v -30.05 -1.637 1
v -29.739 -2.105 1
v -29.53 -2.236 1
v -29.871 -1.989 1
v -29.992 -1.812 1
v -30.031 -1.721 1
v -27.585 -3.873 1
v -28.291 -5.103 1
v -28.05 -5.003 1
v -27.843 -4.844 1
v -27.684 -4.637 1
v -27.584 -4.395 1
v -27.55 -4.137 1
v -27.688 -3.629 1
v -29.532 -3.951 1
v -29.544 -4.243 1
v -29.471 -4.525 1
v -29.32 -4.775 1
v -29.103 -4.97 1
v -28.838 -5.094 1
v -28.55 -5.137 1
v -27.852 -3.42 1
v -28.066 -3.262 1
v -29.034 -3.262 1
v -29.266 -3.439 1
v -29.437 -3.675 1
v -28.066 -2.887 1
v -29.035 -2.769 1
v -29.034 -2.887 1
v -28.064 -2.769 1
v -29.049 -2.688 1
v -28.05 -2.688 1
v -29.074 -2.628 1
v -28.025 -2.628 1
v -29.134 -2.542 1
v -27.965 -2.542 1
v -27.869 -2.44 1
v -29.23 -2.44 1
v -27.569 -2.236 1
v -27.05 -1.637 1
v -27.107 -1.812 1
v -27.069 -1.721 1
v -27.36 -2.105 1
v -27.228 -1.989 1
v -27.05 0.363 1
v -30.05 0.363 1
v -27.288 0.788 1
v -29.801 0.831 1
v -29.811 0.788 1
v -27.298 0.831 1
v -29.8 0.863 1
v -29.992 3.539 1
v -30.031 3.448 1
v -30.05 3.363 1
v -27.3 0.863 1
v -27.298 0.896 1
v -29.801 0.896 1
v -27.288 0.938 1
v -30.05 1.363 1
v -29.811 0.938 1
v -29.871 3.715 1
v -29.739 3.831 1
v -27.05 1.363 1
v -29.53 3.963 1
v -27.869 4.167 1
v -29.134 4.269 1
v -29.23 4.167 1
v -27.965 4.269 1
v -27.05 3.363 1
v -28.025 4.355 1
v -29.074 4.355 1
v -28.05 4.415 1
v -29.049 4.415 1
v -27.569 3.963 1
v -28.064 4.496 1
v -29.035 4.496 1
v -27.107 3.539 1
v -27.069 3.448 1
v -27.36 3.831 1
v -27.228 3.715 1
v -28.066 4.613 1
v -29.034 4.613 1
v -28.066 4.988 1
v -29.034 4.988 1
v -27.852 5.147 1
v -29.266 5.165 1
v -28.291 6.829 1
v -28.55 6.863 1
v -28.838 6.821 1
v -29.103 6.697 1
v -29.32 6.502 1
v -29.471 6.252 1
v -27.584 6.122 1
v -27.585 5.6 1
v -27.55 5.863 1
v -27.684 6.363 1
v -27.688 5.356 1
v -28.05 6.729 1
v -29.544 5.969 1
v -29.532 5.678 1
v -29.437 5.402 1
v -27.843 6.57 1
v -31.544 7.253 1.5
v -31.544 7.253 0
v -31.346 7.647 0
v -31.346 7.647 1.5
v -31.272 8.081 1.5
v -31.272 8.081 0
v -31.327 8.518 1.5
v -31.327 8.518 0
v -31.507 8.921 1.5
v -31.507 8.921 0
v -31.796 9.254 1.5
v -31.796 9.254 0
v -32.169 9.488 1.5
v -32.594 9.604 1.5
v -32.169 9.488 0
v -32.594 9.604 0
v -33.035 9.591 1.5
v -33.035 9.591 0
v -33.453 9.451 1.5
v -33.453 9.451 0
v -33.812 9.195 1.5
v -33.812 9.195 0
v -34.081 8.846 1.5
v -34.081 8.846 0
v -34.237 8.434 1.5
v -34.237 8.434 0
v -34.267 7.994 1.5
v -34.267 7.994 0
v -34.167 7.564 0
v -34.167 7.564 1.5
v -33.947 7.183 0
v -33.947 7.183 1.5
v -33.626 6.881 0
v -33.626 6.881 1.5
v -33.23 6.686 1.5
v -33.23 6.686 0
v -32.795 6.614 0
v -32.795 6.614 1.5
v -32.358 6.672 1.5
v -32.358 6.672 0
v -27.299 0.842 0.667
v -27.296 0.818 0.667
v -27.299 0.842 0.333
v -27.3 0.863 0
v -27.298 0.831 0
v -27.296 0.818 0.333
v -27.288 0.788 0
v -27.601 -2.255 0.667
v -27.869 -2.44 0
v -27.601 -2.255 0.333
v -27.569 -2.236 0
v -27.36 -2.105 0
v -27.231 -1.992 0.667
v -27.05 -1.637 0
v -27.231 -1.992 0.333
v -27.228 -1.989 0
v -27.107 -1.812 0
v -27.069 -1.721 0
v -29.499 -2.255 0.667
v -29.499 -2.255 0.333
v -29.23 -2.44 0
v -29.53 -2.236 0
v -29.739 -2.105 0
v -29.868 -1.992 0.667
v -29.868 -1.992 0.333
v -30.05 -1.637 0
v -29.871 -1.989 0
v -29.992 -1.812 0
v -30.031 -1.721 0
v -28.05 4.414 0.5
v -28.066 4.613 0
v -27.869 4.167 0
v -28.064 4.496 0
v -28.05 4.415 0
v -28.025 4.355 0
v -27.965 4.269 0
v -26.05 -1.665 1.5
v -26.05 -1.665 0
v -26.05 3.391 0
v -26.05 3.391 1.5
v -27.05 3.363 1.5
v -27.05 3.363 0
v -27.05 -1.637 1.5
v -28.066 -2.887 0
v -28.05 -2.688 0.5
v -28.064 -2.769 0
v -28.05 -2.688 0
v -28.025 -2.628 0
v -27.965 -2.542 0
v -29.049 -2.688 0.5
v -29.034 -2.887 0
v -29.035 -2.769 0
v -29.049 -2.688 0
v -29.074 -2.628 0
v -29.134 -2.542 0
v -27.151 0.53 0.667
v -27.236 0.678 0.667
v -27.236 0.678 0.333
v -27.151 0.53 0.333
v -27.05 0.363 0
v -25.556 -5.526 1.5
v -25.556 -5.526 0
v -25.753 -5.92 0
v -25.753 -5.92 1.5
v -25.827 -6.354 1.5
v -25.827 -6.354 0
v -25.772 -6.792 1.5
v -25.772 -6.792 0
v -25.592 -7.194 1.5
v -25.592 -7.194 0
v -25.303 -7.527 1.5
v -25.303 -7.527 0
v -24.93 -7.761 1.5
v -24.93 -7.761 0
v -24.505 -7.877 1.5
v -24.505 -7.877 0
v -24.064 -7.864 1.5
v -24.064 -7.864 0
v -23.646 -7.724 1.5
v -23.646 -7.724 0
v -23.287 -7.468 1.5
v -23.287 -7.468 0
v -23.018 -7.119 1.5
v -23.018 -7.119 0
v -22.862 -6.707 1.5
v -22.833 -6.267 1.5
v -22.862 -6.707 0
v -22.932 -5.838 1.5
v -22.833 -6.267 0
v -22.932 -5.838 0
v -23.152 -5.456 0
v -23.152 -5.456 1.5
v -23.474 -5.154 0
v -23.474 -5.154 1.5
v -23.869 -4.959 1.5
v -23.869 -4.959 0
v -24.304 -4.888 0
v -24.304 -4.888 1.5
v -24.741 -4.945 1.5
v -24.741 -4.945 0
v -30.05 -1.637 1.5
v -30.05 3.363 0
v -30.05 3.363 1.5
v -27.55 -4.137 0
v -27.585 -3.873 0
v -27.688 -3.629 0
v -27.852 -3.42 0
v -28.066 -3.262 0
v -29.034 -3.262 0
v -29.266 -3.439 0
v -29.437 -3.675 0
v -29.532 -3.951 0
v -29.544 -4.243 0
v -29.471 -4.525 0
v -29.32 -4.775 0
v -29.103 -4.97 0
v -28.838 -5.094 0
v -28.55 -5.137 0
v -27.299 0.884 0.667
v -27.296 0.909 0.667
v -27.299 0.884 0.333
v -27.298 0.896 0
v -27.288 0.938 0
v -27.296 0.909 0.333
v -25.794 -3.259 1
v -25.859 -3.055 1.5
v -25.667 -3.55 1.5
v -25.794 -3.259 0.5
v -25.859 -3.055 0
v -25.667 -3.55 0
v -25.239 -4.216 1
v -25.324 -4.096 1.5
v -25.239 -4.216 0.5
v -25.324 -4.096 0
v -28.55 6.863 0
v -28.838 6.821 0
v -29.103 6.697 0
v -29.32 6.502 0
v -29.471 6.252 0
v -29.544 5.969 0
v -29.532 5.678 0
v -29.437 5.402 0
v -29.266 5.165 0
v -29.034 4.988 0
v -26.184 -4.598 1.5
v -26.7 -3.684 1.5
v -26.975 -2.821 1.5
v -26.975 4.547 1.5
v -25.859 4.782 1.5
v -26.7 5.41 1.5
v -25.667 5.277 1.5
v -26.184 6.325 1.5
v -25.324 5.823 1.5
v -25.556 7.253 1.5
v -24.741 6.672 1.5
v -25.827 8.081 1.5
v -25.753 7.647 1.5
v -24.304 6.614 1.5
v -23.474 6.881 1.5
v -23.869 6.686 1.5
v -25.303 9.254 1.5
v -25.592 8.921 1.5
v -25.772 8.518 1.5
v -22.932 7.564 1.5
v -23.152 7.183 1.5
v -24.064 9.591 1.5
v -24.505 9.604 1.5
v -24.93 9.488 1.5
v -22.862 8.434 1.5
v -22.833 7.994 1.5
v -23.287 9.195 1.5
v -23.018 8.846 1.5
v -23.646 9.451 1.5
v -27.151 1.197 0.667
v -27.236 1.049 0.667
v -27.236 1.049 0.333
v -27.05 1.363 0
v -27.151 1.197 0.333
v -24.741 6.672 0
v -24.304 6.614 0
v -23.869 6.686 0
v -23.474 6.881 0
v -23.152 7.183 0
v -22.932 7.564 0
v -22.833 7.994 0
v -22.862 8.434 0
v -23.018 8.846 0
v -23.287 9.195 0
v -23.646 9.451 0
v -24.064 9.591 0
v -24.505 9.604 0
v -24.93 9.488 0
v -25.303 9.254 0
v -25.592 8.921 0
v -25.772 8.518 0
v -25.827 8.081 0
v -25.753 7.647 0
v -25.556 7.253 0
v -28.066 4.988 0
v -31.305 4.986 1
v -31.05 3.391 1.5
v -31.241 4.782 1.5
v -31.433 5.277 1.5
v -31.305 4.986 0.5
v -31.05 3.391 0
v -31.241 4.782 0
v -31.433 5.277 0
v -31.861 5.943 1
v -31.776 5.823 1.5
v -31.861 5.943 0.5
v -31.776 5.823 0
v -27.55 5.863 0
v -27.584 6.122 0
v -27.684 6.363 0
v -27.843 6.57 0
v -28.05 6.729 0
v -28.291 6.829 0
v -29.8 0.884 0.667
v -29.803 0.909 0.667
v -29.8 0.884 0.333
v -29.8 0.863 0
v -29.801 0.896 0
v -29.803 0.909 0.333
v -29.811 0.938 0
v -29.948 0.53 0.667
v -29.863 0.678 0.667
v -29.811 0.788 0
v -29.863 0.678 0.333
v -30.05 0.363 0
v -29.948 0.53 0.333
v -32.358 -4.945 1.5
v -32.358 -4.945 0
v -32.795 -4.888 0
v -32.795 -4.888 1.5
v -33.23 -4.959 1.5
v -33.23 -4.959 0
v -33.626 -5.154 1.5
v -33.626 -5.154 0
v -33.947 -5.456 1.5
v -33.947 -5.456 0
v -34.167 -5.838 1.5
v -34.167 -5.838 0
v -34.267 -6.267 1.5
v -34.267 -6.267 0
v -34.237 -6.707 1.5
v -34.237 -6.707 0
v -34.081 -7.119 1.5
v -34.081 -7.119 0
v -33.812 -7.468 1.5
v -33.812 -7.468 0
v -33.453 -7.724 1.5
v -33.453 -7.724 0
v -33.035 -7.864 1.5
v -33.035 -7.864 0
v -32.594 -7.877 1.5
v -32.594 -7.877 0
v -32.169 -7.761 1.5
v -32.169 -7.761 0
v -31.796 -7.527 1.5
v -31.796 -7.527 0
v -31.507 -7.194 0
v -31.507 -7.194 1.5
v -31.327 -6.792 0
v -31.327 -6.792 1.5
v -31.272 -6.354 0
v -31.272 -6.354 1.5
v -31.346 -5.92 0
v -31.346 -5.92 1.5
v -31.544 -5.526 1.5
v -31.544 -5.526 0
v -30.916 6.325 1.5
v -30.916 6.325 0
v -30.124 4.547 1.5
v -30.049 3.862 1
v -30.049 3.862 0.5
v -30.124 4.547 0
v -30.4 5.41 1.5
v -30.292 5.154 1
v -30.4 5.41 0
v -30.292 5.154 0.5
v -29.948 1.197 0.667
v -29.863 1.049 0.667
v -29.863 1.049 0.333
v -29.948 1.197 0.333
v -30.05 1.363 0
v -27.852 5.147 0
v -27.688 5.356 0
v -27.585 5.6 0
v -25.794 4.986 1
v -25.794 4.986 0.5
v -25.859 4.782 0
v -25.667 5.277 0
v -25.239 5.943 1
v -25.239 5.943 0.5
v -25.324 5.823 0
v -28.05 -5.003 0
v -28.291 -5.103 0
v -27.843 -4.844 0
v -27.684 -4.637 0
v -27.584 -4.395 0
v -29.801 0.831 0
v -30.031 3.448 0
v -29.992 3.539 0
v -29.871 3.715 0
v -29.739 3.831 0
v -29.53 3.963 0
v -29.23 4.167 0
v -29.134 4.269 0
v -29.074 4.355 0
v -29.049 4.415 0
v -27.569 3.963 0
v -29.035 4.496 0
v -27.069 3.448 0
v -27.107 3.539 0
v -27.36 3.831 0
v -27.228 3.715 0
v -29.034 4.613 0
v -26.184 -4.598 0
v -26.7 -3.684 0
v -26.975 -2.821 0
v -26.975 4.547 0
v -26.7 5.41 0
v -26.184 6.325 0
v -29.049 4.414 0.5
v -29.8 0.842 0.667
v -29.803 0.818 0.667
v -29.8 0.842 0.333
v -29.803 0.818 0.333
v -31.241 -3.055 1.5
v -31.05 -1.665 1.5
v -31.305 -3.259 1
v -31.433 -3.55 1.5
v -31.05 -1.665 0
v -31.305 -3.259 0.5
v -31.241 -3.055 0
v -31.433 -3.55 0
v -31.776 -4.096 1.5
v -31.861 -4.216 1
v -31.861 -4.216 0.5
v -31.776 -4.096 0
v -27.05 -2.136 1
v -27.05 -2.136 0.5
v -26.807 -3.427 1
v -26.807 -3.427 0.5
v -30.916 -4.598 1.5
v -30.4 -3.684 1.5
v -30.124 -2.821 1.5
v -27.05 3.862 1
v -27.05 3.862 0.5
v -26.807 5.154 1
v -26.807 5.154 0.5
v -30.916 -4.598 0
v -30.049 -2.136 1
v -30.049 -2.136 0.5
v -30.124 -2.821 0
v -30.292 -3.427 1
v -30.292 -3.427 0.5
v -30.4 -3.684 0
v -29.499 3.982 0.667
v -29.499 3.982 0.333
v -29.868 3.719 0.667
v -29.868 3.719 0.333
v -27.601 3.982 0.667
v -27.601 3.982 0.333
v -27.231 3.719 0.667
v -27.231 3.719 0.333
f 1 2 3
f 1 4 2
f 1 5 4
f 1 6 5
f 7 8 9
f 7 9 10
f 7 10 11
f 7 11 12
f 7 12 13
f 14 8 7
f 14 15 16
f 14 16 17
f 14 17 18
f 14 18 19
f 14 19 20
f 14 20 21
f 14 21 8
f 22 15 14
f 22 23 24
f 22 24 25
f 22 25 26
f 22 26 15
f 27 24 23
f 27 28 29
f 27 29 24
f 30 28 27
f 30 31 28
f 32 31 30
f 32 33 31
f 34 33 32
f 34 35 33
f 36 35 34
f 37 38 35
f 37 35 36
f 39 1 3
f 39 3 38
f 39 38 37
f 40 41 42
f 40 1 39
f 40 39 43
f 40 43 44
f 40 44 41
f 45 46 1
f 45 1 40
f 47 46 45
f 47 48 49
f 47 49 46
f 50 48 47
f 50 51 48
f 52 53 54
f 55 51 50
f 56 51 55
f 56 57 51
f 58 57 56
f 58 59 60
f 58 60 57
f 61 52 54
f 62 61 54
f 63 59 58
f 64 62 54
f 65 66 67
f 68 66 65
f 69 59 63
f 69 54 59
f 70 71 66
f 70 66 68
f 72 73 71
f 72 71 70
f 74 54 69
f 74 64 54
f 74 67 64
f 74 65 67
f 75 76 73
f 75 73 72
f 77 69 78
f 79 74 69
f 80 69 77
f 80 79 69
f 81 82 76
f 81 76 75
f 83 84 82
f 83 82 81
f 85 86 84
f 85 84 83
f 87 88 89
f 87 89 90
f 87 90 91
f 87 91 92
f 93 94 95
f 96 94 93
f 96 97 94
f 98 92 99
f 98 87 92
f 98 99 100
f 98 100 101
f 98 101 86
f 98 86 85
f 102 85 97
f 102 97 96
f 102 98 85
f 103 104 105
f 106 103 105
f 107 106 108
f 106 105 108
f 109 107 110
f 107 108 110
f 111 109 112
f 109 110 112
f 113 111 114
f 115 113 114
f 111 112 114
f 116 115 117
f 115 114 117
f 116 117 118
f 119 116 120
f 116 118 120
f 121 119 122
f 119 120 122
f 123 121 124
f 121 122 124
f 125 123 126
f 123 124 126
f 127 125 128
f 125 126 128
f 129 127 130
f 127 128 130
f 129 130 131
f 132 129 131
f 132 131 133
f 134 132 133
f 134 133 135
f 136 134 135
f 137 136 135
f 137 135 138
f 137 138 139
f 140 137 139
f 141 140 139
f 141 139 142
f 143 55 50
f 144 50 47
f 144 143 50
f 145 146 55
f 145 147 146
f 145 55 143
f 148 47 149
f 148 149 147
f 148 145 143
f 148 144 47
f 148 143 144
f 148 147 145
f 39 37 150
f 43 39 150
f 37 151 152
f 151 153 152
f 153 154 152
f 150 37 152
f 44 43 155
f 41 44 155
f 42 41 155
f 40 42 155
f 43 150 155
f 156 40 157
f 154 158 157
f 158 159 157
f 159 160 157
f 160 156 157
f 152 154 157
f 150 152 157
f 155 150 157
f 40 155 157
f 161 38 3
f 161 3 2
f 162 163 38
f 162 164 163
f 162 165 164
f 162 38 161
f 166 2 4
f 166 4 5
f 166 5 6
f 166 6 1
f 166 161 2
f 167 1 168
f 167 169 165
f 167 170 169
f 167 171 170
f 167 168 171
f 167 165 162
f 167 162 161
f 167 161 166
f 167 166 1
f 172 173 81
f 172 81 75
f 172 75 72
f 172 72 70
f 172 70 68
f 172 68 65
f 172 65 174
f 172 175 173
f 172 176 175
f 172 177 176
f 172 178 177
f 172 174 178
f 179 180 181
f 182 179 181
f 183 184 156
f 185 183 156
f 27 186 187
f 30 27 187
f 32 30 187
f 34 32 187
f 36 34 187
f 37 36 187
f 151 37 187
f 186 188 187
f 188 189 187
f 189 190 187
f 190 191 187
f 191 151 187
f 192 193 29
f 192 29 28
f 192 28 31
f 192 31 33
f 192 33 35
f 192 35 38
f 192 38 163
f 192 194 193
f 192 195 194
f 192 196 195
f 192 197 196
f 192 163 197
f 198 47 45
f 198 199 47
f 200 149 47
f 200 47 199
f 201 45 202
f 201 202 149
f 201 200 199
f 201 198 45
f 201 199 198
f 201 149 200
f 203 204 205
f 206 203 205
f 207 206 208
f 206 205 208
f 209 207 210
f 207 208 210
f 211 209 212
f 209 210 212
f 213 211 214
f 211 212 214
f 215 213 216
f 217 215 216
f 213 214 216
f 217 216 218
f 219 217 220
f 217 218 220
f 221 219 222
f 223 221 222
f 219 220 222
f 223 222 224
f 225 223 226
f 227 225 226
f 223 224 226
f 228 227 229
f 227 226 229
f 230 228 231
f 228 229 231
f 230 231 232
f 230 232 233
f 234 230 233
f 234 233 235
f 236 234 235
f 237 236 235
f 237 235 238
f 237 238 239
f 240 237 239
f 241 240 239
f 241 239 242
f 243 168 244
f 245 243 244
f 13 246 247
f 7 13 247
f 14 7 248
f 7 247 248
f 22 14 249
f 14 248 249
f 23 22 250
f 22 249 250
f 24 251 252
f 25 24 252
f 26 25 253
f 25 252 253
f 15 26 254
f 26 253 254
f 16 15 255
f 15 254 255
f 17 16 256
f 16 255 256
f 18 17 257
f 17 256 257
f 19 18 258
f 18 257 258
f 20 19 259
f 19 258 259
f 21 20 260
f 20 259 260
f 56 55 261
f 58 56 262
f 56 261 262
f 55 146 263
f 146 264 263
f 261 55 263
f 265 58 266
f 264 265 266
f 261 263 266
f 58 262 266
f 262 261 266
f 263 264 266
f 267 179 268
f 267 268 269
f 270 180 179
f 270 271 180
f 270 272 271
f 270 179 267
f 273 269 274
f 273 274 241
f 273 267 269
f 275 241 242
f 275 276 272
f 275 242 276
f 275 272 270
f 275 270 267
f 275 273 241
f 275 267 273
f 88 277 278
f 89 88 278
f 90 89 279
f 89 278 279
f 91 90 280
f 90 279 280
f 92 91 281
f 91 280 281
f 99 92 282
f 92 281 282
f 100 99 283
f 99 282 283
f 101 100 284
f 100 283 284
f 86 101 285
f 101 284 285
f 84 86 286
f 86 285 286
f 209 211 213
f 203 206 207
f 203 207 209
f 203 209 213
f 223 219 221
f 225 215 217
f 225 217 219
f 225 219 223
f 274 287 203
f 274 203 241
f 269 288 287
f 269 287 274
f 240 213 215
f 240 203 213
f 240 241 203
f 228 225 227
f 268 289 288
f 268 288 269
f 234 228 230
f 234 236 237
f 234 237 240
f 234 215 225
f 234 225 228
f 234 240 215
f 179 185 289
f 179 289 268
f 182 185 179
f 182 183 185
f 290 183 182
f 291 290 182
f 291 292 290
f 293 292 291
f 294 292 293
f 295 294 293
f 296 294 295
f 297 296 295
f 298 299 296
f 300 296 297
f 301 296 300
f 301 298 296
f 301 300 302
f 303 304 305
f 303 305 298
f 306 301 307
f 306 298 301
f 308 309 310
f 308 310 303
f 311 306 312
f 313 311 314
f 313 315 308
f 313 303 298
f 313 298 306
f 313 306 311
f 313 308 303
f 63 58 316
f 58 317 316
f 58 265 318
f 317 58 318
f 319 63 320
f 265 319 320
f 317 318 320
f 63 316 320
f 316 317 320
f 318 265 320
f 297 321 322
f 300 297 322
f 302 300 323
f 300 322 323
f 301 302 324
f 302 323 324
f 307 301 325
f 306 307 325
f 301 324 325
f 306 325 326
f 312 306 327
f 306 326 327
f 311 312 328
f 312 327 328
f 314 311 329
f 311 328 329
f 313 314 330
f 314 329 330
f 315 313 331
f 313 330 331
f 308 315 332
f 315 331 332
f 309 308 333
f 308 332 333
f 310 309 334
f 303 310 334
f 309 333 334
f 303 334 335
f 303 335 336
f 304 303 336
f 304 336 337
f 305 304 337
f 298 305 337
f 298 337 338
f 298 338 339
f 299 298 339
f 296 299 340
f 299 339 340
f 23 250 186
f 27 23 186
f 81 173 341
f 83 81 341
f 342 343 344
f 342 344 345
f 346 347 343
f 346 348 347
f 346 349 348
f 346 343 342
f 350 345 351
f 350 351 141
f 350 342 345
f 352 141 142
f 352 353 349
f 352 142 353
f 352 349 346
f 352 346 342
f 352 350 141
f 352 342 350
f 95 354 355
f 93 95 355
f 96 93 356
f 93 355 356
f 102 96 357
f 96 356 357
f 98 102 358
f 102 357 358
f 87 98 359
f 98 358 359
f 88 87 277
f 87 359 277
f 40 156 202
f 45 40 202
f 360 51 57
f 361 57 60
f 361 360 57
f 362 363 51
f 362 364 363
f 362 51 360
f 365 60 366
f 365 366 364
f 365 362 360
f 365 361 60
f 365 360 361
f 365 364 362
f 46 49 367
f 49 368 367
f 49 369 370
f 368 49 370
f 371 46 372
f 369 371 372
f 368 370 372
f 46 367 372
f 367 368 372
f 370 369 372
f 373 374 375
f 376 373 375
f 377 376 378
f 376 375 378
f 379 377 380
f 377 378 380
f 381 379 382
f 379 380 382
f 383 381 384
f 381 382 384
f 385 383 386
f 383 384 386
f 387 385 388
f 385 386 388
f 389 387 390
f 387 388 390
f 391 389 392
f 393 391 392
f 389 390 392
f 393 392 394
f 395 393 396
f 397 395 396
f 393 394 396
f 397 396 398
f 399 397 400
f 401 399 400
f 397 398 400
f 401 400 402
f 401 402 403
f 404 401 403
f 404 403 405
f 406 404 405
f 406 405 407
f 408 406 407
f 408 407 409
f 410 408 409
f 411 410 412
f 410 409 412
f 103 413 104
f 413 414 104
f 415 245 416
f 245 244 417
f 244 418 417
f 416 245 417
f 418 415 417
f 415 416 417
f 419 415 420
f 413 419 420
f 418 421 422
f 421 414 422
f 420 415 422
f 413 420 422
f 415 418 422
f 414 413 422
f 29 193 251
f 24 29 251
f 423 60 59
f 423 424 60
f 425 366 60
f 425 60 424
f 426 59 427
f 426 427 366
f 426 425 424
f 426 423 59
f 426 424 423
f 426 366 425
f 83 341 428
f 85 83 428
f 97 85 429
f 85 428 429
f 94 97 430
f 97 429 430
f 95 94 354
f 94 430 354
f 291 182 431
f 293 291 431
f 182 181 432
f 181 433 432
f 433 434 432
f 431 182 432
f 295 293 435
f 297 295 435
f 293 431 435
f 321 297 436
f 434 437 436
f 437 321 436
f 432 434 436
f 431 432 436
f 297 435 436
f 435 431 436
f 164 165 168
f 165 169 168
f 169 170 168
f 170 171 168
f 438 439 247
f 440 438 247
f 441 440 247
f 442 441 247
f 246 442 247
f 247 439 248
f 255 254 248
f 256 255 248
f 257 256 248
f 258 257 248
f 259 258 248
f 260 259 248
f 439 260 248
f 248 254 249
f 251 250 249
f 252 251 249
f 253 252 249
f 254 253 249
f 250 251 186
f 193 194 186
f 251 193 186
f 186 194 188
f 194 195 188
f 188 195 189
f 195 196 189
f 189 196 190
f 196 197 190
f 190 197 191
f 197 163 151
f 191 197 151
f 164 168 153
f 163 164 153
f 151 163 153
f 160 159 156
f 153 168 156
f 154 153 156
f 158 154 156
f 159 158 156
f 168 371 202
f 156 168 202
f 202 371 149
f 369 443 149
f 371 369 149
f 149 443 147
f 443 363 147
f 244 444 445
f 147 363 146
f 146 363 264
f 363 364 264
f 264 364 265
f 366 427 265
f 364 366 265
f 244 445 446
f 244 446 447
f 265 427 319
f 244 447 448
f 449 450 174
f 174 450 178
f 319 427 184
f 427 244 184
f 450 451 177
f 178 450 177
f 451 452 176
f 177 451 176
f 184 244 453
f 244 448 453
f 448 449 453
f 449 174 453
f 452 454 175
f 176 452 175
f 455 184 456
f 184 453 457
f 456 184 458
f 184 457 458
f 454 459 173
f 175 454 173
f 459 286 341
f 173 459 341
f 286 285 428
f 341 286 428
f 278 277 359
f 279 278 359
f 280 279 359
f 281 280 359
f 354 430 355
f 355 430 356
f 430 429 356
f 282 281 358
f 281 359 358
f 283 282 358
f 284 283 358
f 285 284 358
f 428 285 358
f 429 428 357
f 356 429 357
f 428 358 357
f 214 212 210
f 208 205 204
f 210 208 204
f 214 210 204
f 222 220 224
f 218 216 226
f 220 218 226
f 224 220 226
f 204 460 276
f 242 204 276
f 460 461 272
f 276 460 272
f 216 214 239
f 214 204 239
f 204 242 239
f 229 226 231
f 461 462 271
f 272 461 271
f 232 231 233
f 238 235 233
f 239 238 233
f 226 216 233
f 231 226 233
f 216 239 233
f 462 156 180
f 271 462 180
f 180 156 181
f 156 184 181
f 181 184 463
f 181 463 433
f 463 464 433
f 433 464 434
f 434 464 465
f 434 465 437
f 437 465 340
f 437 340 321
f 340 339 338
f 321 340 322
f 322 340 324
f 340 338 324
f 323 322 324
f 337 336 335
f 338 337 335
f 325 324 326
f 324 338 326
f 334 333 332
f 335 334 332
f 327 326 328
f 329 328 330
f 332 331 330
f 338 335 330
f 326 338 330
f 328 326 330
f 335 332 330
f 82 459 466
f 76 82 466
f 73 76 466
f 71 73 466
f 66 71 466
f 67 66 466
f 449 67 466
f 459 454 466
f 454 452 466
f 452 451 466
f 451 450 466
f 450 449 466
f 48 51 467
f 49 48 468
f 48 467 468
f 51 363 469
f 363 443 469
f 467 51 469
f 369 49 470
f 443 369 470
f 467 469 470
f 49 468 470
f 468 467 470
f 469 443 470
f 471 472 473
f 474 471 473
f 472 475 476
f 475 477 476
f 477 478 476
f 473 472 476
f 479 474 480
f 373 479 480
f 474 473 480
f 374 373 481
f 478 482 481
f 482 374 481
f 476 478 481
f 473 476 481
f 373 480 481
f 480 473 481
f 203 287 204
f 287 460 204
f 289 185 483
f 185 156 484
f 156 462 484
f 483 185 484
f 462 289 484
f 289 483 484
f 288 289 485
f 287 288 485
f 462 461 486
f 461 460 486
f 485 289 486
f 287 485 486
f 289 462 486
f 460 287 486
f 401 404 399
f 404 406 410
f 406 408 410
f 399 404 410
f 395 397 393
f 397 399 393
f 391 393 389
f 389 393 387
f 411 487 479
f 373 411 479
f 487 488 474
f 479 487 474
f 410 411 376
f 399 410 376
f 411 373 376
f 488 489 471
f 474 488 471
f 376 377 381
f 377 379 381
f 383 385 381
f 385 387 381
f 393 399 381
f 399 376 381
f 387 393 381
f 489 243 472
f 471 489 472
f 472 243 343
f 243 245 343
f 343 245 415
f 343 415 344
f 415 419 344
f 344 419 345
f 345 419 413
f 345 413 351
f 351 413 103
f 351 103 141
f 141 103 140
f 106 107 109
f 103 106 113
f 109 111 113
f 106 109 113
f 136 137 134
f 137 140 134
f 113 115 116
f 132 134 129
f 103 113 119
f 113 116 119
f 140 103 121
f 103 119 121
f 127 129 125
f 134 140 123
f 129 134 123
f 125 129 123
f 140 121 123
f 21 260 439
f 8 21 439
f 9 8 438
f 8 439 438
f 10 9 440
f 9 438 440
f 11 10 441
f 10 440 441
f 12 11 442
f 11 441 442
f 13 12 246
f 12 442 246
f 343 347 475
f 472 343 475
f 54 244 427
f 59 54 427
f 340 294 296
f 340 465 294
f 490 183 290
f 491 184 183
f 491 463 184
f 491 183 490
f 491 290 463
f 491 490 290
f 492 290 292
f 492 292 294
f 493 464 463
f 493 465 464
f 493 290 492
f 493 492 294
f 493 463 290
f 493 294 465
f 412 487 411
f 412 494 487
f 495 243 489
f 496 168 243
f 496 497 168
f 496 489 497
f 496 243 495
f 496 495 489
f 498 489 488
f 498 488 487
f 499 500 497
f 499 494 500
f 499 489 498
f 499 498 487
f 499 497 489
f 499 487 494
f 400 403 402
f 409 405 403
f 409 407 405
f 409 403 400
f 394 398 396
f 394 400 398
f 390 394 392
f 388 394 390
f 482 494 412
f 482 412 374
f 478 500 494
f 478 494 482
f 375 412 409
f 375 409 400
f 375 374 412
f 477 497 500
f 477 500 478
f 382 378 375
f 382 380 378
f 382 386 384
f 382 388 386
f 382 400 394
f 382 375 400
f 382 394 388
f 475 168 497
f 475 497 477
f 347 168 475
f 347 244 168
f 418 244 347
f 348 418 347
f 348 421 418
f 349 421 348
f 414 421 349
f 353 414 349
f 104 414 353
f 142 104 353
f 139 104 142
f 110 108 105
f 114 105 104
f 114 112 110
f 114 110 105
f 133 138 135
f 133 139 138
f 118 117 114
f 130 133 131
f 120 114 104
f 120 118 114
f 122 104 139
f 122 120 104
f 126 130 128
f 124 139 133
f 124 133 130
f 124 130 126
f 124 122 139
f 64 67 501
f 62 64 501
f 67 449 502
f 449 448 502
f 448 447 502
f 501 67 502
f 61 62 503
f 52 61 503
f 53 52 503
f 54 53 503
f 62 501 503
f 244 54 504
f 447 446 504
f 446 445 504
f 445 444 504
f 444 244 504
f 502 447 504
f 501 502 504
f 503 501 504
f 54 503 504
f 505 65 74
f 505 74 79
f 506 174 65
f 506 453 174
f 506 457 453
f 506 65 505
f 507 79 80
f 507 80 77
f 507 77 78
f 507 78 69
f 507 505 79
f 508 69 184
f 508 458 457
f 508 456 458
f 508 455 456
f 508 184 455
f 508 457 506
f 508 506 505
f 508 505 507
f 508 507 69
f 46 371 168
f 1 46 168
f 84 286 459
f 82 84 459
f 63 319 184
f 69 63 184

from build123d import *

# Parameters (mm, degrees)
F1_DEPTH = 1.5
F2_DEPTH = 1.5
F3_DEPTH = 1


with BuildPart() as f1:
    # F0 (on Top) → F1 (new body)
    with BuildSketch(Plane.XY):
        with BuildLine():
            add(Edge.make_bspline(
                [(-30.0496753657, -1.6366143987), (-30.0447041216, -1.7843464579), (-30.0354722057, -2.1747955176), (-30.1677635937, -3.5729716552), (-31.0591334265, -4.8206491721), (-31.5437565653, -5.5257683036)],
                knots=[0, 0, 0, 0, 0.2067765284, 0.5424050749, 1, 1, 1, 1], degree=3))
            Line((-30.0496753657, -1.6366143987), (-30.0496753657, 0.3633856013))
            Line((-30.0496753657, 0.3633856013), (-30.0496753657, 0.8633856013))
            Line((-30.0496753657, 0.8633856013), (-30.0496753657, 1.3633856013))
            Line((-30.0496753657, 1.3633856013), (-30.0496753657, 3.3633856013))
            add(Edge.make_bspline(
                [(-30.0496753657, 3.3633856013), (-30.0447041216, 3.5111176605), (-30.0354722057, 3.9015667201), (-30.1677635937, 5.2997428578), (-31.0591334265, 6.5474203747), (-31.5437565653, 7.2525395061)],
                knots=[0, 0, 0, 0, 0.2067765284, 0.5424050749, 1, 1, 1, 1], degree=3))
            ThreePointArc((-31.5437565653, 7.2525395061), (-33.6418347537, 9.3359584926), (-32.358351935, 6.672269582))
            add(Edge.make_bspline(
                [(-31.0496753657, 3.3913564036), (-31.0943634617, 3.9612452912), (-31.1769454956, 5.0019170089), (-31.8575168826, 5.9280431025), (-32.2003766787, 6.4320003208), (-32.358351935, 6.672269582)],
                knots=[0, 0, 0, 0, 0.3895106376, 0.7119480371, 1, 1, 1, 1], degree=3))
            Line((-31.0496753657, 3.3913564036), (-31.0496753657, 0.8633856013))
            Line((-31.0496753657, 0.8633856013), (-31.0496753657, -1.6645852011))
            add(Edge.make_bspline(
                [(-31.0496753657, -1.6645852011), (-31.0943634617, -2.2344740887), (-31.1769454956, -3.2751458064), (-31.8575168826, -4.2012719), (-32.2003766787, -4.7052291183), (-32.358351935, -4.9454983795)],
                knots=[0, 0, 0, 0, 0.3895106376, 0.7119480371, 1, 1, 1, 1], degree=3))
            ThreePointArc((-32.358351935, -4.9454983795), (-33.6418347537, -7.60918729), (-31.5437565653, -5.5257683036))
        make_face()
    extrude(amount=F1_DEPTH)


with BuildPart() as f2:
    # F0 (on Top) → F2 (new body)
    with BuildSketch(Plane.XY):
        with BuildLine():
            Line((-27.0496753657, 1.3633856013), (-27.0496753657, 0.8633856013))
            Line((-27.0496753657, 0.8633856013), (-27.0496753657, 0.3633856013))
            Line((-27.0496753657, 0.3633856013), (-27.0496753657, -1.6366143987))
            add(Edge.make_bspline(
                [(-27.0496753657, -1.6366143987), (-27.0546466099, -1.7843464579), (-27.0638785258, -2.1747955176), (-26.9315871377, -3.5729716552), (-26.040217305, -4.8206491721), (-25.5555941662, -5.5257683036)],
                knots=[0, 0, 0, 0, 0.2067765284, 0.5424050749, 1, 1, 1, 1], degree=3))
            ThreePointArc((-25.5555941662, -5.5257683036), (-23.4575159777, -7.60918729), (-24.7409987965, -4.9454983795))
            add(Edge.make_bspline(
                [(-26.0496753657, -1.6645852011), (-26.0049872698, -2.2344740887), (-25.9224052359, -3.2751458064), (-25.2418338489, -4.2012719), (-24.8989740528, -4.7052291183), (-24.7409987965, -4.9454983795)],
                knots=[0, 0, 0, 0, 0.3895106376, 0.7119480371, 1, 1, 1, 1], degree=3))
            Line((-26.0496753657, -1.6645852011), (-26.0496753657, 0.8633856013))
            Line((-26.0496753657, 0.8633856013), (-26.0496753657, 3.3913564036))
            add(Edge.make_bspline(
                [(-26.0496753657, 3.3913564036), (-26.0049872698, 3.9612452912), (-25.9224052359, 5.0019170089), (-25.2418338489, 5.9280431025), (-24.8989740528, 6.4320003208), (-24.7409987965, 6.672269582)],
                knots=[0, 0, 0, 0, 0.3895106376, 0.7119480371, 1, 1, 1, 1], degree=3))
            ThreePointArc((-24.7409987965, 6.672269582), (-23.4575159777, 9.3359584926), (-25.5555941662, 7.2525395061))
            add(Edge.make_bspline(
                [(-27.0496753657, 3.3633856013), (-27.0546466099, 3.5111176605), (-27.0638785258, 3.9015667201), (-26.9315871377, 5.2997428578), (-26.040217305, 6.5474203747), (-25.5555941662, 7.2525395061)],
                knots=[0, 0, 0, 0, 0.2067765284, 0.5424050749, 1, 1, 1, 1], degree=3))
            Line((-27.0496753657, 3.3633856013), (-27.0496753657, 1.3633856013))
        make_face()
    extrude(amount=F2_DEPTH)


with BuildPart() as f3:
    # F0 (on Top) → F3 (new body)
    with BuildSketch(Plane.XY):
        with BuildLine():
            Line((-27.0496753657, -1.6366143987), (-27.0496753657, 0.3633856013))
            add(Edge.make_bspline(
                [(-27.2881601661, 0.7883856013), (-27.258692413, 0.7028713607), (-27.1541838894, 0.533128481), (-27.0496753657, 0.3633856013)],
                knots=[0.2829426223, 0.2829426223, 0.2829426223, 0.2829426223, 1, 1, 1, 1], degree=3))
            add(Edge.make_bspline(
                [(-27.2996753657, 0.8633856013), (-27.2997315847, 0.8427570708), (-27.2997878037, 0.8221285404), (-27.2881601661, 0.7883856013)],
                knots=[0, 0, 0, 0, 0.2829426223, 0.2829426223, 0.2829426223, 0.2829426223], degree=3))
            add(Edge.make_bspline(
                [(-27.2996753657, 0.8633856013), (-27.2997315847, 0.8840141317), (-27.2997878037, 0.9046426621), (-27.2881601661, 0.9383856013)],
                knots=[0, 0, 0, 0, 0.2829426223, 0.2829426223, 0.2829426223, 0.2829426223], degree=3))
            add(Edge.make_bspline(
                [(-27.2881601661, 0.9383856013), (-27.258692413, 1.0238998418), (-27.1541838894, 1.1936427216), (-27.0496753657, 1.3633856013)],
                knots=[0.2829426223, 0.2829426223, 0.2829426223, 0.2829426223, 1, 1, 1, 1], degree=3))
            Line((-27.0496753657, 1.3633856013), (-27.0496753657, 3.3633856013))
            add(Edge.make_bspline(
                [(-27.8689055473, 4.1666570684), (-27.8155701958, 4.1169842068), (-27.5858548192, 3.9655823837), (-27.2088354742, 3.7642275563), (-27.0612582834, 3.469689666), (-27.0496753657, 3.3633856013)],
                knots=[0, 0, 0, 0, 0.3042885587, 0.663393524, 1, 1, 1, 1], degree=3))
            add(Edge.make_bspline(
                [(-28.0655524475, 4.6133856013), (-28.0668851606, 4.542992142), (-28.0697081163, 4.3922834039), (-27.9751788737, 4.2713964572), (-27.8689055473, 4.1666570684)],
                knots=[0, 0, 0, 0, 0.4464717881, 1, 1, 1, 1], degree=3))
            Line((-28.0655524475, 4.6133856013), (-28.0655524475, 4.9883856013))
            ThreePointArc((-28.0655524475, 4.9883856013), (-28.5496753657, 4.8633856013), (-29.033798284, 4.9883856013))
            Line((-29.033798284, 4.9883856013), (-29.033798284, 4.6133856013))
            add(Edge.make_bspline(
                [(-29.033798284, 4.6133856013), (-29.0324655709, 4.542992142), (-29.0296426152, 4.3922834039), (-29.1241718577, 4.2713964572), (-29.2304451842, 4.1666570684)],
                knots=[0, 0, 0, 0, 0.4464717881, 1, 1, 1, 1], degree=3))
            add(Edge.make_bspline(
                [(-29.2304451842, 4.1666570684), (-29.2837805357, 4.1169842068), (-29.5134959123, 3.9655823837), (-29.8905152573, 3.7642275563), (-30.0380924481, 3.469689666), (-30.0496753657, 3.3633856013)],
                knots=[0, 0, 0, 0, 0.3042885587, 0.663393524, 1, 1, 1, 1], degree=3))
            Line((-30.0496753657, 3.3633856013), (-30.0496753657, 1.3633856013))
            add(Edge.make_bspline(
                [(-29.8111905654, 0.9383856013), (-29.8406583184, 1.0238998418), (-29.9451668421, 1.1936427216), (-30.0496753657, 1.3633856013)],
                knots=[0.2829426223, 0.2829426223, 0.2829426223, 0.2829426223, 1, 1, 1, 1], degree=3))
            add(Edge.make_bspline(
                [(-29.7996753657, 0.8633856013), (-29.7996191468, 0.8840141317), (-29.7995629278, 0.9046426621), (-29.8111905654, 0.9383856013)],
                knots=[0, 0, 0, 0, 0.2829426223, 0.2829426223, 0.2829426223, 0.2829426223], degree=3))
            add(Edge.make_bspline(
                [(-29.7996753657, 0.8633856013), (-29.7996191468, 0.8427570708), (-29.7995629278, 0.8221285404), (-29.8111905654, 0.7883856013)],
                knots=[0, 0, 0, 0, 0.2829426223, 0.2829426223, 0.2829426223, 0.2829426223], degree=3))
            add(Edge.make_bspline(
                [(-29.8111905654, 0.7883856013), (-29.8406583184, 0.7028713607), (-29.9451668421, 0.533128481), (-30.0496753657, 0.3633856013)],
                knots=[0.2829426223, 0.2829426223, 0.2829426223, 0.2829426223, 1, 1, 1, 1], degree=3))
            Line((-30.0496753657, 0.3633856013), (-30.0496753657, -1.6366143987))
            add(Edge.make_bspline(
                [(-29.2304451842, -2.4398858659), (-29.2837805357, -2.3902130043), (-29.5134959123, -2.2388111812), (-29.8905152573, -2.0374563537), (-30.0380924481, -1.7429184635), (-30.0496753657, -1.6366143987)],
                knots=[0, 0, 0, 0, 0.3042885587, 0.663393524, 1, 1, 1, 1], degree=3))
            add(Edge.make_bspline(
                [(-29.033798284, -2.8866143987), (-29.0324655709, -2.8162209395), (-29.0296426152, -2.6655122014), (-29.1241718577, -2.5446252546), (-29.2304451842, -2.4398858659)],
                knots=[0, 0, 0, 0, 0.4464717881, 1, 1, 1, 1], degree=3))
            Line((-29.033798284, -2.8866143987), (-29.033798284, -3.2616143987))
            ThreePointArc((-29.033798284, -3.2616143987), (-28.5496753657, -3.1366143987), (-28.0655524475, -3.2616143987))
            Line((-28.0655524475, -3.2616143987), (-28.0655524475, -2.8866143987))
            add(Edge.make_bspline(
                [(-28.0655524475, -2.8866143987), (-28.0668851606, -2.8162209395), (-28.0697081163, -2.6655122014), (-27.9751788737, -2.5446252546), (-27.8689055473, -2.4398858659)],
                knots=[0, 0, 0, 0, 0.4464717881, 1, 1, 1, 1], degree=3))
            add(Edge.make_bspline(
                [(-27.8689055473, -2.4398858659), (-27.8155701958, -2.3902130043), (-27.5858548192, -2.2388111812), (-27.2088354742, -2.0374563537), (-27.0612582834, -1.7429184635), (-27.0496753657, -1.6366143987)],
                knots=[0, 0, 0, 0, 0.3042885587, 0.663393524, 1, 1, 1, 1], degree=3))
        make_face()
        with BuildLine():
            ThreePointArc((-29.033798284, 4.9883856013), (-28.5496753657, 4.8633856013), (-28.0655524475, 4.9883856013))
            ThreePointArc((-28.0655524475, 4.9883856013), (-27.6882454736, 5.3555090997), (-27.5496753657, 5.8633856013))
            ThreePointArc((-27.5496753657, 5.8633856013), (-27.8425685845, 6.5704923824), (-28.5496753657, 6.8633856013))
            ThreePointArc((-28.5496753657, 6.8633856013), (-29.5179212023, 6.1133856013), (-29.033798284, 4.9883856013))
        make_face()
        with BuildLine():
            ThreePointArc((-27.5496753657, -4.1366143987), (-27.6882454736, -3.6287378972), (-28.0655524475, -3.2616143987))
            ThreePointArc((-28.0655524475, -3.2616143987), (-28.5496753657, -3.1366143987), (-29.033798284, -3.2616143987))
            ThreePointArc((-29.033798284, -3.2616143987), (-29.5179212023, -4.3866143987), (-28.5496753657, -5.1366143987))
            ThreePointArc((-28.5496753657, -5.1366143987), (-27.8425685845, -4.8437211799), (-27.5496753657, -4.1366143987))
        make_face()
    extrude(amount=F3_DEPTH)


solid = Compound([f1.part, f2.part, f3.part])
